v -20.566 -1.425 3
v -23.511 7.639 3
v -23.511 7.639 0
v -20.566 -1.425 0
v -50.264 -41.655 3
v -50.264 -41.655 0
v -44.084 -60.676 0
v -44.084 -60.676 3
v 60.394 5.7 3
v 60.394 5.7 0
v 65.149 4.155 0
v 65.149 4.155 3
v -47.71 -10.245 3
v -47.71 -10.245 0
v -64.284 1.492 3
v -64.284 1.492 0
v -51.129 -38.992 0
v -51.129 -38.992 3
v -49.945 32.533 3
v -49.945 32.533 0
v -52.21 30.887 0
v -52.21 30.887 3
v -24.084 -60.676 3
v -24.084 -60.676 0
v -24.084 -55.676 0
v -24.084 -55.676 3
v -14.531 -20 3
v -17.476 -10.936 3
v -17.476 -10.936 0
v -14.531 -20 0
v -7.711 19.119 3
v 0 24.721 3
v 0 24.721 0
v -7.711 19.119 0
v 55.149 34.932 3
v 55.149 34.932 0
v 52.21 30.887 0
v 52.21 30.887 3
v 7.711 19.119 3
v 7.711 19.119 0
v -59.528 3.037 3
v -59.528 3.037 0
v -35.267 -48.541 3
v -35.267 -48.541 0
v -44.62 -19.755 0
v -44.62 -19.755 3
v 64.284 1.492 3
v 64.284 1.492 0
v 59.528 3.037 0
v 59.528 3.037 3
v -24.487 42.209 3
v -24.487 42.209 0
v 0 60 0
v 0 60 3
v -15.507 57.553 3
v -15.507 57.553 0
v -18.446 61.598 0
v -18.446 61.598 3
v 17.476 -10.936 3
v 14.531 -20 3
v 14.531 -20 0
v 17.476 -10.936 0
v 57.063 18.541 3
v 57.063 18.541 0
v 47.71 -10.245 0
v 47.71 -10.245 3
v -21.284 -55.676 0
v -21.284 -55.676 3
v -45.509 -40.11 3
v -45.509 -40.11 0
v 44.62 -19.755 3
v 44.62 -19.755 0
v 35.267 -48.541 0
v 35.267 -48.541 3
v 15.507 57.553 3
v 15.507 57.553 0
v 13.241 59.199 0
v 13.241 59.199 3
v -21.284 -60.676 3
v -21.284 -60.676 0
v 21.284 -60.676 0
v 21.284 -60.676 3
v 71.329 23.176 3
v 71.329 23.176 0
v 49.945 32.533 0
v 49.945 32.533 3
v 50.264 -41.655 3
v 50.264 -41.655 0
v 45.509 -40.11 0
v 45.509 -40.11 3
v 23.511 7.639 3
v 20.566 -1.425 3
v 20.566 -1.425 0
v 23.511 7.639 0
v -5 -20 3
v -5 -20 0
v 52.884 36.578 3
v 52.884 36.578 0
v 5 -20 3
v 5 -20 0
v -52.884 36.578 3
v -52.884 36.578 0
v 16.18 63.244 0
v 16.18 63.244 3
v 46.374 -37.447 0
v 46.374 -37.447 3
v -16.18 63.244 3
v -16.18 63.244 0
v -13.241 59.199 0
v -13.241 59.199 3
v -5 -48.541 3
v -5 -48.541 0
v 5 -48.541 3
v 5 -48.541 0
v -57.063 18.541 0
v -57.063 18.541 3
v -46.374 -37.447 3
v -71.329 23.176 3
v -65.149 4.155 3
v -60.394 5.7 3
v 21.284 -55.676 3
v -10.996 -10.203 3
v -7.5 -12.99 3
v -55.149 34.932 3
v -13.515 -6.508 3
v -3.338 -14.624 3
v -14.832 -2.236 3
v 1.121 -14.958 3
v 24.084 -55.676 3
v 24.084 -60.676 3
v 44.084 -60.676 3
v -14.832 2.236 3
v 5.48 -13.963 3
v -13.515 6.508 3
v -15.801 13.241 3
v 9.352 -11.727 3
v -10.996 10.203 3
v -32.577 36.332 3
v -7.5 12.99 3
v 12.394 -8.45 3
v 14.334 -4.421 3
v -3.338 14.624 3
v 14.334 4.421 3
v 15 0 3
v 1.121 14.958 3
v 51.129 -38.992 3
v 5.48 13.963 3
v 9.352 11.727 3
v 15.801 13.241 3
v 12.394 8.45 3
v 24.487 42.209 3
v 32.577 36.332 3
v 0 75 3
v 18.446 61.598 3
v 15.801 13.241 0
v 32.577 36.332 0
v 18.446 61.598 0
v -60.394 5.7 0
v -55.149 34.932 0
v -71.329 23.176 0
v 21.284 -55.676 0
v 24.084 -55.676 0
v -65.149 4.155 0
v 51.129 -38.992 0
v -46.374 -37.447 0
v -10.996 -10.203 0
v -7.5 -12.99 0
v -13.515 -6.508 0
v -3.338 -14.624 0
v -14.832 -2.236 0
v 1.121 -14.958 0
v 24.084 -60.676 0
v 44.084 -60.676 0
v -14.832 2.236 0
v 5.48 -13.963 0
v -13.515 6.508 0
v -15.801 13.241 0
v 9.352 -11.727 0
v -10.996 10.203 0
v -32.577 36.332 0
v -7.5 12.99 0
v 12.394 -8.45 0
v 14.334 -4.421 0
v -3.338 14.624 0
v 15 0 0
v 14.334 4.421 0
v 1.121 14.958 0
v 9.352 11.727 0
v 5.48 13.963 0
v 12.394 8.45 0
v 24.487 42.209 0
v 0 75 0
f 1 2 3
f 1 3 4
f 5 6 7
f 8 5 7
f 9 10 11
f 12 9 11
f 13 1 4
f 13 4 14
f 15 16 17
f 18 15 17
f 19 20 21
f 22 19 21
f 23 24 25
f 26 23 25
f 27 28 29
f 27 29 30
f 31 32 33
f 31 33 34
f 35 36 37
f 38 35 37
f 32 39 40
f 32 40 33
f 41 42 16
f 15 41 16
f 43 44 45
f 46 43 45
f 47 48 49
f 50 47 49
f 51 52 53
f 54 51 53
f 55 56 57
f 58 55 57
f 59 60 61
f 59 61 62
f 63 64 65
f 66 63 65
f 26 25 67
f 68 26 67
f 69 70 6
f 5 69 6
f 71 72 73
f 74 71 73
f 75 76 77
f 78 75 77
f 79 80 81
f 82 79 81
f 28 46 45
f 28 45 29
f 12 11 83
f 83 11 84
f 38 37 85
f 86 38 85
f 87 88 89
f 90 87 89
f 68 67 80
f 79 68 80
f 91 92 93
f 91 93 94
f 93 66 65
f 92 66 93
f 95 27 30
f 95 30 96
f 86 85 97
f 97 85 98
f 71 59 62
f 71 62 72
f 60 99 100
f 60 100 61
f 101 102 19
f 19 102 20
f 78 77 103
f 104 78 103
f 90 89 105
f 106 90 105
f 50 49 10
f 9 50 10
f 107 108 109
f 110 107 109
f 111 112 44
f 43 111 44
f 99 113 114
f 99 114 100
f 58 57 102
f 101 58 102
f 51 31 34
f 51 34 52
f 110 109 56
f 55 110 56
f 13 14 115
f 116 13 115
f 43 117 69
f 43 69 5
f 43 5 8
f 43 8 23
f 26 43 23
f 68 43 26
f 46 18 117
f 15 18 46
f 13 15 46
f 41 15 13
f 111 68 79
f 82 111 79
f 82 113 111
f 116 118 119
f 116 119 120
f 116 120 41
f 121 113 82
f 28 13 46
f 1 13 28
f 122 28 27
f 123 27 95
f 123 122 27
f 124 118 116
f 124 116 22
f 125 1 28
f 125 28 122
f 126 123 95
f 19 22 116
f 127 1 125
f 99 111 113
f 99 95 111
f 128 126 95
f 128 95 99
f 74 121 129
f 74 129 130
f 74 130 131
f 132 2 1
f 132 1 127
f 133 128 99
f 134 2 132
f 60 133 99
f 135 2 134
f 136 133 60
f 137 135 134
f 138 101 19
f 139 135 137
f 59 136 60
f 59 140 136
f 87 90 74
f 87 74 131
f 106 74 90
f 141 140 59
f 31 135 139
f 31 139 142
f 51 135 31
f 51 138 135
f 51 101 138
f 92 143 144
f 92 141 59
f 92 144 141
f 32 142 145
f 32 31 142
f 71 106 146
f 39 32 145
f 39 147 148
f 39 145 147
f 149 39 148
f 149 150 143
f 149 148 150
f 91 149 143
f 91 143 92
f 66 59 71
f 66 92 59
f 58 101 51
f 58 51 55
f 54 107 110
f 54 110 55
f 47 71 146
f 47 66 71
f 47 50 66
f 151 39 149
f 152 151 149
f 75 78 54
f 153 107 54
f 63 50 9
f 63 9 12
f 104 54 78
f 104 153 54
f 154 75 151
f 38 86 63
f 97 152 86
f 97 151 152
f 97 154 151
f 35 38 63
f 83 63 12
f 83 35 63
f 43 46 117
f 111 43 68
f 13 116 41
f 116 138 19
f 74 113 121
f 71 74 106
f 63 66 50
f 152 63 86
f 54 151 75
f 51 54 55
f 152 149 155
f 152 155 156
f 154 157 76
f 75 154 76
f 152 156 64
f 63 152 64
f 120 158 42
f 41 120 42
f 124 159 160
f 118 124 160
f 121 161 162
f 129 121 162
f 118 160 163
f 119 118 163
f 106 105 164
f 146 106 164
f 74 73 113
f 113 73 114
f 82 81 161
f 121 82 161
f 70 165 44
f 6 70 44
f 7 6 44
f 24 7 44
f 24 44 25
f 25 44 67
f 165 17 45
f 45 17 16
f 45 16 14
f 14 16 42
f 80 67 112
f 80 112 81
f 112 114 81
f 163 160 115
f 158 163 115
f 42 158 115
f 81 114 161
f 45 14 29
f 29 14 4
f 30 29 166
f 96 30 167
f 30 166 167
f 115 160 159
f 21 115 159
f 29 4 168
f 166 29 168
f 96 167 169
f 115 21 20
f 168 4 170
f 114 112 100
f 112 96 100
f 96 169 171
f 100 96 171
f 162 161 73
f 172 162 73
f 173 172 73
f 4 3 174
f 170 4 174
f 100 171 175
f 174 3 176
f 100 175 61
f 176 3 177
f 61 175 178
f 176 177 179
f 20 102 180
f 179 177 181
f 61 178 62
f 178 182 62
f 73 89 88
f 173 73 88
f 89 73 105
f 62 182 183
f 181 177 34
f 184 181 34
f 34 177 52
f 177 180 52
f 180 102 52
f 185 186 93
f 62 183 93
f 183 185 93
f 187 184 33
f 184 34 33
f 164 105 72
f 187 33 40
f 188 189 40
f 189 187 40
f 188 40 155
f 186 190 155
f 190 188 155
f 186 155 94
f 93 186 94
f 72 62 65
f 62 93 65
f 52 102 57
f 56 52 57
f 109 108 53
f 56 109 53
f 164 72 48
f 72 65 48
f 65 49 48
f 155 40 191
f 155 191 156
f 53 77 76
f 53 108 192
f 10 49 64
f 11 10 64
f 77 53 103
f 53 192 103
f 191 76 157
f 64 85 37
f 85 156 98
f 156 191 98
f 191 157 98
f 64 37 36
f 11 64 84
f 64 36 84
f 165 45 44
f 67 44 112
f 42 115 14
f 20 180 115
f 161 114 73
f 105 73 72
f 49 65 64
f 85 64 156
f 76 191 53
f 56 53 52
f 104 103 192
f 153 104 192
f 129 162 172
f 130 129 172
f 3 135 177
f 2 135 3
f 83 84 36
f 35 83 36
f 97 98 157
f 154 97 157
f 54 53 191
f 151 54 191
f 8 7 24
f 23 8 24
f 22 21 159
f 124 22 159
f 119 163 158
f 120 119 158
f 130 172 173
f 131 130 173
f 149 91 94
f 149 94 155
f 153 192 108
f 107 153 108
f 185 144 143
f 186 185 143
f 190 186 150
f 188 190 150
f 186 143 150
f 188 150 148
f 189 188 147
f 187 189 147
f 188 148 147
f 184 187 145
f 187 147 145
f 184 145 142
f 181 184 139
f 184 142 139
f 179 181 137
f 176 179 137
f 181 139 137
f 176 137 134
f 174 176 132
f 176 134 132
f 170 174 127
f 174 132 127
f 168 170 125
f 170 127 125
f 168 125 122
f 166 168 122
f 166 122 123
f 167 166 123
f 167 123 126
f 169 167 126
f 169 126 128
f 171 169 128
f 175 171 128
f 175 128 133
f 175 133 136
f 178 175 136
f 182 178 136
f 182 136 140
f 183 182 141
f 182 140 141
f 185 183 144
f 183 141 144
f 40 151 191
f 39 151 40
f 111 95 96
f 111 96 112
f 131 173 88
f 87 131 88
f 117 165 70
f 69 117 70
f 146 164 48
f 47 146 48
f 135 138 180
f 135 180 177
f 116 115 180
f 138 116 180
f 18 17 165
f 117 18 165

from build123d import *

# Parameters (mm, degrees)
F1_DEPTH = 3
F2_R     = 15
F3_DEPTH = 3


with BuildPart() as f1:
    # F0 (on Top) → F1 (new body)
    with BuildSketch(Plane.XY):
        Polygon((16.18034, 63.244295), (0, 75), (-16.18034, 63.244295), (-13.241414, 59.19921), (-15.506661, 57.553411), (-18.445587, 61.598496), (-52.883651, 36.577778), (-49.944725, 32.532693), (-52.209973, 30.886895), (-55.148899, 34.93198), (-71.329239, 23.176275), (-65.148899, 4.155144), (-60.393616, 5.700229), (-59.528369, 3.037271), (-64.283651, 1.492186), (-51.129481, -38.992186), (-46.374199, -37.447101), (-45.508951, -40.110059), (-50.264234, -41.655144), (-44.083894, -60.676275), (-24.083894, -60.676275), (-24.083894, -55.676275), (-21.283894, -55.676275), (-21.283894, -60.676275), (21.283894, -60.676275), (21.283894, -55.676275), (24.083894, -55.676275), (24.083894, -60.676275), (44.083894, -60.676275), (50.264234, -41.655144), (45.508951, -40.110059), (46.374199, -37.447101), (51.129481, -38.992186), (64.283651, 1.492186), (59.528369, 3.037271), (60.393616, 5.700229), (65.148899, 4.155144), (71.329239, 23.176275), (55.148899, 34.93198), (52.209973, 30.886895), (49.944725, 32.532693), (52.883651, 36.577778), (18.445587, 61.598496), (15.506661, 57.553411), (13.241414, 59.19921), align=None)
        Polygon((-57.063391, 18.54102), (0, 60), (57.063391, 18.54102), (35.267115, -48.54102), (-35.267115, -48.54102), align=None, mode=Mode.SUBTRACT)
    extrude(amount=F1_DEPTH)

    # F2 (on face) → F3 (join)
    with BuildSketch(Plane.XY.offset(3)):
        Polygon((5, -20), (14.530851, -20), (17.476045, -10.935622), (44.620168, -19.755283), (47.710338, -10.244717), (20.566215, -1.425057), (23.51141, 7.63932), (15.80079, 13.241414), (32.57678, 36.331584), (24.486611, 42.209436), (7.71062, 19.119266), (0, 24.72136), (-7.71062, 19.119266), (-24.486611, 42.209436), (-32.57678, 36.331584), (-15.80079, 13.241414), (-23.51141, 7.63932), (-20.566215, -1.425057), (-47.710338, -10.244717), (-44.620168, -19.755283), (-17.476045, -10.935622), (-14.530851, -20), (-5, -20), (-5, -48.54102), (5, -48.54102), align=None)
        Circle(F2_R, mode=Mode.SUBTRACT)
    extrude(amount=-F3_DEPTH)


solid = f1.part
